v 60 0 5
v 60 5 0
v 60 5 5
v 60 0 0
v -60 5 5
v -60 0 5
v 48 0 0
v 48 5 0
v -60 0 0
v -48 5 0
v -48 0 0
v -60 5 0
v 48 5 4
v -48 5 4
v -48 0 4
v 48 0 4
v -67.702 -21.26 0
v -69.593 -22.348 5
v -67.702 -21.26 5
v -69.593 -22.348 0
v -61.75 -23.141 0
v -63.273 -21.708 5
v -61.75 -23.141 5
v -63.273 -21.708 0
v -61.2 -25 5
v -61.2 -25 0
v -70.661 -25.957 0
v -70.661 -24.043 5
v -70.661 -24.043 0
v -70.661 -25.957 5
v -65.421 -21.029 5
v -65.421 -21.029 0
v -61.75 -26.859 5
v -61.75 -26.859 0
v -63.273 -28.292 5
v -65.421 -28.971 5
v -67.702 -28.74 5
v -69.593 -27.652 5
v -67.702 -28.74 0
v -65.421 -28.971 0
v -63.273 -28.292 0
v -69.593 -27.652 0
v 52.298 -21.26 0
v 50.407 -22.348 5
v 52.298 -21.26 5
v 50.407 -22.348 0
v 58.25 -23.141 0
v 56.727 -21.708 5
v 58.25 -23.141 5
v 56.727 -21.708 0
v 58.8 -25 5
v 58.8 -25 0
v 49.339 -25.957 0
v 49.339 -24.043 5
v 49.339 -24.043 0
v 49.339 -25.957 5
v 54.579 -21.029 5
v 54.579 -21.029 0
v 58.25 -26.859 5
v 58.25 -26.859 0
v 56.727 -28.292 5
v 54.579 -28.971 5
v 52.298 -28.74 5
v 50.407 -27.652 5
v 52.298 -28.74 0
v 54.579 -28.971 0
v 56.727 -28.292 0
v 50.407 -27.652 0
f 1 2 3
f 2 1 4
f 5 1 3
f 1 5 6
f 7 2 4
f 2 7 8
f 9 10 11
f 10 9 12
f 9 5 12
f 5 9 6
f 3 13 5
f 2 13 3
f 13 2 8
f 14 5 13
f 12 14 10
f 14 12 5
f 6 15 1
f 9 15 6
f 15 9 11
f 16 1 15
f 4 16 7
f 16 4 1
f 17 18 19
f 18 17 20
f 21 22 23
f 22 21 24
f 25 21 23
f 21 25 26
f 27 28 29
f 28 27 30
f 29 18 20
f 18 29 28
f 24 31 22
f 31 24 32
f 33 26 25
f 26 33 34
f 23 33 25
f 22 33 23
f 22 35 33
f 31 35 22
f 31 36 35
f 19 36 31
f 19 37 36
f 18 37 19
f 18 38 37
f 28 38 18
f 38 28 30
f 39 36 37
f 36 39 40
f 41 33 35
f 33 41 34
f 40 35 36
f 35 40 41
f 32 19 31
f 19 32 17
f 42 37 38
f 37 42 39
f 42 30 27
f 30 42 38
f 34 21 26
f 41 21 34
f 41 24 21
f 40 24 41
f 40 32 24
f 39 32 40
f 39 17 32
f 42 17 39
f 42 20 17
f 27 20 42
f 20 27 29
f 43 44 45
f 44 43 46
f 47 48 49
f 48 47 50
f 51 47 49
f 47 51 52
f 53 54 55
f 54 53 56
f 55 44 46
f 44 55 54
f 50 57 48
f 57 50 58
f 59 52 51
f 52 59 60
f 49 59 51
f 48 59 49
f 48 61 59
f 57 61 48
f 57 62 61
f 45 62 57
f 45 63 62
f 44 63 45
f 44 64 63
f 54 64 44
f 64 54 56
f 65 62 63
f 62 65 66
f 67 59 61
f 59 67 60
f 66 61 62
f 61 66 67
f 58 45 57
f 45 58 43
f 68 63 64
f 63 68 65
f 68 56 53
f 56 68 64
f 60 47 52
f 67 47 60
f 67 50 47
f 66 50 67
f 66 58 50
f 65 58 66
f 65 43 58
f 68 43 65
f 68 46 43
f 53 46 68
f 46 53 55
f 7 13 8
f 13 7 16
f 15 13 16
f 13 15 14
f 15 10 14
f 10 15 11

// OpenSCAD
// EVT-0 AR-lite frame
scale([1.2,1,1]) difference() {
  union() {
    translate([-50,0,0]) cube([100,5,5]);
    translate([-55,-25,0]) cylinder(h=5,d=8);
    translate([45,-25,0]) cylinder(h=5,d=8);
  }
  translate([0,0,-1]) cube([80,30,10], center=true);
}
